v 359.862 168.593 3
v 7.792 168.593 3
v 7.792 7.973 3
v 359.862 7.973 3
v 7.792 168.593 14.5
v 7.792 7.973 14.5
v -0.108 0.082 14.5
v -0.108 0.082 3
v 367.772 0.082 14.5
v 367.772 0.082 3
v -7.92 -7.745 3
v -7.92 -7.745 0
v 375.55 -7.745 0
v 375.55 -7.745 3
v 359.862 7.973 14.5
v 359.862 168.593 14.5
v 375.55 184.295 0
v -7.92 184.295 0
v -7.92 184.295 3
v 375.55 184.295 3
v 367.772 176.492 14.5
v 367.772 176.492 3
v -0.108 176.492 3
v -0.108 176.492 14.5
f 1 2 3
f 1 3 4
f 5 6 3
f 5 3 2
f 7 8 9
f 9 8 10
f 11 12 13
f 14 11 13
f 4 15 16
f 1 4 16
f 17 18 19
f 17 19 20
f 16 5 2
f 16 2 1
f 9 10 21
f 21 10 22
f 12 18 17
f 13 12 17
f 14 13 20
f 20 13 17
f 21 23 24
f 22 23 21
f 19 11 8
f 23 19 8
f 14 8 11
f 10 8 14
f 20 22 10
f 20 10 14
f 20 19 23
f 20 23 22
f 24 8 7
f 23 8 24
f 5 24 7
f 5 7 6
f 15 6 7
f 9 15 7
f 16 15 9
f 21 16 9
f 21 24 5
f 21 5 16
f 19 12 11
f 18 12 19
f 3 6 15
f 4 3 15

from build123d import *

# Parameters (mm, degrees)
SKETCH_5_W          = 383.47
SKETCH_5_H          = 192.04
EXTRUDE_2_DEPTH     = 3
EXTRUDE_START       = 3
SKETCH_6_W          = 367.88
SKETCH_6_H          = 176.41
EXTRUDE_3_DEPTH     = 11.5
CUT_EXTRUDE_START   = 14.5
SKETCH_7_W          = 352.07
SKETCH_7_H          = 160.62
CUT_EXTRUDE_1_DEPTH = 11.5


with BuildPart() as part:
    # 草图5 → 凸台-拉伸2 (new body)
    with BuildSketch(Plane.XY):
        with Locations((183.815306963, 88.27515573)):
            Rectangle(SKETCH_5_W, SKETCH_5_H)
    extrude(amount=EXTRUDE_2_DEPTH)

    # 草图6 → 凸台-拉伸3 (add)
    with BuildSketch(Plane.XY.offset(EXTRUDE_START)):
        with Locations((183.832314811, 88.286576554)):
            Rectangle(SKETCH_6_W, SKETCH_6_H)
    extrude(amount=EXTRUDE_3_DEPTH)

    # 草图7 → 切除-拉伸1 (cut)
    with BuildSketch(Plane.XY.offset(CUT_EXTRUDE_START)):
        with Locations((183.827427543, 88.282627)):
            Rectangle(SKETCH_7_W, SKETCH_7_H)
    extrude(amount=-CUT_EXTRUDE_1_DEPTH, mode=Mode.SUBTRACT)


solid = part.part
